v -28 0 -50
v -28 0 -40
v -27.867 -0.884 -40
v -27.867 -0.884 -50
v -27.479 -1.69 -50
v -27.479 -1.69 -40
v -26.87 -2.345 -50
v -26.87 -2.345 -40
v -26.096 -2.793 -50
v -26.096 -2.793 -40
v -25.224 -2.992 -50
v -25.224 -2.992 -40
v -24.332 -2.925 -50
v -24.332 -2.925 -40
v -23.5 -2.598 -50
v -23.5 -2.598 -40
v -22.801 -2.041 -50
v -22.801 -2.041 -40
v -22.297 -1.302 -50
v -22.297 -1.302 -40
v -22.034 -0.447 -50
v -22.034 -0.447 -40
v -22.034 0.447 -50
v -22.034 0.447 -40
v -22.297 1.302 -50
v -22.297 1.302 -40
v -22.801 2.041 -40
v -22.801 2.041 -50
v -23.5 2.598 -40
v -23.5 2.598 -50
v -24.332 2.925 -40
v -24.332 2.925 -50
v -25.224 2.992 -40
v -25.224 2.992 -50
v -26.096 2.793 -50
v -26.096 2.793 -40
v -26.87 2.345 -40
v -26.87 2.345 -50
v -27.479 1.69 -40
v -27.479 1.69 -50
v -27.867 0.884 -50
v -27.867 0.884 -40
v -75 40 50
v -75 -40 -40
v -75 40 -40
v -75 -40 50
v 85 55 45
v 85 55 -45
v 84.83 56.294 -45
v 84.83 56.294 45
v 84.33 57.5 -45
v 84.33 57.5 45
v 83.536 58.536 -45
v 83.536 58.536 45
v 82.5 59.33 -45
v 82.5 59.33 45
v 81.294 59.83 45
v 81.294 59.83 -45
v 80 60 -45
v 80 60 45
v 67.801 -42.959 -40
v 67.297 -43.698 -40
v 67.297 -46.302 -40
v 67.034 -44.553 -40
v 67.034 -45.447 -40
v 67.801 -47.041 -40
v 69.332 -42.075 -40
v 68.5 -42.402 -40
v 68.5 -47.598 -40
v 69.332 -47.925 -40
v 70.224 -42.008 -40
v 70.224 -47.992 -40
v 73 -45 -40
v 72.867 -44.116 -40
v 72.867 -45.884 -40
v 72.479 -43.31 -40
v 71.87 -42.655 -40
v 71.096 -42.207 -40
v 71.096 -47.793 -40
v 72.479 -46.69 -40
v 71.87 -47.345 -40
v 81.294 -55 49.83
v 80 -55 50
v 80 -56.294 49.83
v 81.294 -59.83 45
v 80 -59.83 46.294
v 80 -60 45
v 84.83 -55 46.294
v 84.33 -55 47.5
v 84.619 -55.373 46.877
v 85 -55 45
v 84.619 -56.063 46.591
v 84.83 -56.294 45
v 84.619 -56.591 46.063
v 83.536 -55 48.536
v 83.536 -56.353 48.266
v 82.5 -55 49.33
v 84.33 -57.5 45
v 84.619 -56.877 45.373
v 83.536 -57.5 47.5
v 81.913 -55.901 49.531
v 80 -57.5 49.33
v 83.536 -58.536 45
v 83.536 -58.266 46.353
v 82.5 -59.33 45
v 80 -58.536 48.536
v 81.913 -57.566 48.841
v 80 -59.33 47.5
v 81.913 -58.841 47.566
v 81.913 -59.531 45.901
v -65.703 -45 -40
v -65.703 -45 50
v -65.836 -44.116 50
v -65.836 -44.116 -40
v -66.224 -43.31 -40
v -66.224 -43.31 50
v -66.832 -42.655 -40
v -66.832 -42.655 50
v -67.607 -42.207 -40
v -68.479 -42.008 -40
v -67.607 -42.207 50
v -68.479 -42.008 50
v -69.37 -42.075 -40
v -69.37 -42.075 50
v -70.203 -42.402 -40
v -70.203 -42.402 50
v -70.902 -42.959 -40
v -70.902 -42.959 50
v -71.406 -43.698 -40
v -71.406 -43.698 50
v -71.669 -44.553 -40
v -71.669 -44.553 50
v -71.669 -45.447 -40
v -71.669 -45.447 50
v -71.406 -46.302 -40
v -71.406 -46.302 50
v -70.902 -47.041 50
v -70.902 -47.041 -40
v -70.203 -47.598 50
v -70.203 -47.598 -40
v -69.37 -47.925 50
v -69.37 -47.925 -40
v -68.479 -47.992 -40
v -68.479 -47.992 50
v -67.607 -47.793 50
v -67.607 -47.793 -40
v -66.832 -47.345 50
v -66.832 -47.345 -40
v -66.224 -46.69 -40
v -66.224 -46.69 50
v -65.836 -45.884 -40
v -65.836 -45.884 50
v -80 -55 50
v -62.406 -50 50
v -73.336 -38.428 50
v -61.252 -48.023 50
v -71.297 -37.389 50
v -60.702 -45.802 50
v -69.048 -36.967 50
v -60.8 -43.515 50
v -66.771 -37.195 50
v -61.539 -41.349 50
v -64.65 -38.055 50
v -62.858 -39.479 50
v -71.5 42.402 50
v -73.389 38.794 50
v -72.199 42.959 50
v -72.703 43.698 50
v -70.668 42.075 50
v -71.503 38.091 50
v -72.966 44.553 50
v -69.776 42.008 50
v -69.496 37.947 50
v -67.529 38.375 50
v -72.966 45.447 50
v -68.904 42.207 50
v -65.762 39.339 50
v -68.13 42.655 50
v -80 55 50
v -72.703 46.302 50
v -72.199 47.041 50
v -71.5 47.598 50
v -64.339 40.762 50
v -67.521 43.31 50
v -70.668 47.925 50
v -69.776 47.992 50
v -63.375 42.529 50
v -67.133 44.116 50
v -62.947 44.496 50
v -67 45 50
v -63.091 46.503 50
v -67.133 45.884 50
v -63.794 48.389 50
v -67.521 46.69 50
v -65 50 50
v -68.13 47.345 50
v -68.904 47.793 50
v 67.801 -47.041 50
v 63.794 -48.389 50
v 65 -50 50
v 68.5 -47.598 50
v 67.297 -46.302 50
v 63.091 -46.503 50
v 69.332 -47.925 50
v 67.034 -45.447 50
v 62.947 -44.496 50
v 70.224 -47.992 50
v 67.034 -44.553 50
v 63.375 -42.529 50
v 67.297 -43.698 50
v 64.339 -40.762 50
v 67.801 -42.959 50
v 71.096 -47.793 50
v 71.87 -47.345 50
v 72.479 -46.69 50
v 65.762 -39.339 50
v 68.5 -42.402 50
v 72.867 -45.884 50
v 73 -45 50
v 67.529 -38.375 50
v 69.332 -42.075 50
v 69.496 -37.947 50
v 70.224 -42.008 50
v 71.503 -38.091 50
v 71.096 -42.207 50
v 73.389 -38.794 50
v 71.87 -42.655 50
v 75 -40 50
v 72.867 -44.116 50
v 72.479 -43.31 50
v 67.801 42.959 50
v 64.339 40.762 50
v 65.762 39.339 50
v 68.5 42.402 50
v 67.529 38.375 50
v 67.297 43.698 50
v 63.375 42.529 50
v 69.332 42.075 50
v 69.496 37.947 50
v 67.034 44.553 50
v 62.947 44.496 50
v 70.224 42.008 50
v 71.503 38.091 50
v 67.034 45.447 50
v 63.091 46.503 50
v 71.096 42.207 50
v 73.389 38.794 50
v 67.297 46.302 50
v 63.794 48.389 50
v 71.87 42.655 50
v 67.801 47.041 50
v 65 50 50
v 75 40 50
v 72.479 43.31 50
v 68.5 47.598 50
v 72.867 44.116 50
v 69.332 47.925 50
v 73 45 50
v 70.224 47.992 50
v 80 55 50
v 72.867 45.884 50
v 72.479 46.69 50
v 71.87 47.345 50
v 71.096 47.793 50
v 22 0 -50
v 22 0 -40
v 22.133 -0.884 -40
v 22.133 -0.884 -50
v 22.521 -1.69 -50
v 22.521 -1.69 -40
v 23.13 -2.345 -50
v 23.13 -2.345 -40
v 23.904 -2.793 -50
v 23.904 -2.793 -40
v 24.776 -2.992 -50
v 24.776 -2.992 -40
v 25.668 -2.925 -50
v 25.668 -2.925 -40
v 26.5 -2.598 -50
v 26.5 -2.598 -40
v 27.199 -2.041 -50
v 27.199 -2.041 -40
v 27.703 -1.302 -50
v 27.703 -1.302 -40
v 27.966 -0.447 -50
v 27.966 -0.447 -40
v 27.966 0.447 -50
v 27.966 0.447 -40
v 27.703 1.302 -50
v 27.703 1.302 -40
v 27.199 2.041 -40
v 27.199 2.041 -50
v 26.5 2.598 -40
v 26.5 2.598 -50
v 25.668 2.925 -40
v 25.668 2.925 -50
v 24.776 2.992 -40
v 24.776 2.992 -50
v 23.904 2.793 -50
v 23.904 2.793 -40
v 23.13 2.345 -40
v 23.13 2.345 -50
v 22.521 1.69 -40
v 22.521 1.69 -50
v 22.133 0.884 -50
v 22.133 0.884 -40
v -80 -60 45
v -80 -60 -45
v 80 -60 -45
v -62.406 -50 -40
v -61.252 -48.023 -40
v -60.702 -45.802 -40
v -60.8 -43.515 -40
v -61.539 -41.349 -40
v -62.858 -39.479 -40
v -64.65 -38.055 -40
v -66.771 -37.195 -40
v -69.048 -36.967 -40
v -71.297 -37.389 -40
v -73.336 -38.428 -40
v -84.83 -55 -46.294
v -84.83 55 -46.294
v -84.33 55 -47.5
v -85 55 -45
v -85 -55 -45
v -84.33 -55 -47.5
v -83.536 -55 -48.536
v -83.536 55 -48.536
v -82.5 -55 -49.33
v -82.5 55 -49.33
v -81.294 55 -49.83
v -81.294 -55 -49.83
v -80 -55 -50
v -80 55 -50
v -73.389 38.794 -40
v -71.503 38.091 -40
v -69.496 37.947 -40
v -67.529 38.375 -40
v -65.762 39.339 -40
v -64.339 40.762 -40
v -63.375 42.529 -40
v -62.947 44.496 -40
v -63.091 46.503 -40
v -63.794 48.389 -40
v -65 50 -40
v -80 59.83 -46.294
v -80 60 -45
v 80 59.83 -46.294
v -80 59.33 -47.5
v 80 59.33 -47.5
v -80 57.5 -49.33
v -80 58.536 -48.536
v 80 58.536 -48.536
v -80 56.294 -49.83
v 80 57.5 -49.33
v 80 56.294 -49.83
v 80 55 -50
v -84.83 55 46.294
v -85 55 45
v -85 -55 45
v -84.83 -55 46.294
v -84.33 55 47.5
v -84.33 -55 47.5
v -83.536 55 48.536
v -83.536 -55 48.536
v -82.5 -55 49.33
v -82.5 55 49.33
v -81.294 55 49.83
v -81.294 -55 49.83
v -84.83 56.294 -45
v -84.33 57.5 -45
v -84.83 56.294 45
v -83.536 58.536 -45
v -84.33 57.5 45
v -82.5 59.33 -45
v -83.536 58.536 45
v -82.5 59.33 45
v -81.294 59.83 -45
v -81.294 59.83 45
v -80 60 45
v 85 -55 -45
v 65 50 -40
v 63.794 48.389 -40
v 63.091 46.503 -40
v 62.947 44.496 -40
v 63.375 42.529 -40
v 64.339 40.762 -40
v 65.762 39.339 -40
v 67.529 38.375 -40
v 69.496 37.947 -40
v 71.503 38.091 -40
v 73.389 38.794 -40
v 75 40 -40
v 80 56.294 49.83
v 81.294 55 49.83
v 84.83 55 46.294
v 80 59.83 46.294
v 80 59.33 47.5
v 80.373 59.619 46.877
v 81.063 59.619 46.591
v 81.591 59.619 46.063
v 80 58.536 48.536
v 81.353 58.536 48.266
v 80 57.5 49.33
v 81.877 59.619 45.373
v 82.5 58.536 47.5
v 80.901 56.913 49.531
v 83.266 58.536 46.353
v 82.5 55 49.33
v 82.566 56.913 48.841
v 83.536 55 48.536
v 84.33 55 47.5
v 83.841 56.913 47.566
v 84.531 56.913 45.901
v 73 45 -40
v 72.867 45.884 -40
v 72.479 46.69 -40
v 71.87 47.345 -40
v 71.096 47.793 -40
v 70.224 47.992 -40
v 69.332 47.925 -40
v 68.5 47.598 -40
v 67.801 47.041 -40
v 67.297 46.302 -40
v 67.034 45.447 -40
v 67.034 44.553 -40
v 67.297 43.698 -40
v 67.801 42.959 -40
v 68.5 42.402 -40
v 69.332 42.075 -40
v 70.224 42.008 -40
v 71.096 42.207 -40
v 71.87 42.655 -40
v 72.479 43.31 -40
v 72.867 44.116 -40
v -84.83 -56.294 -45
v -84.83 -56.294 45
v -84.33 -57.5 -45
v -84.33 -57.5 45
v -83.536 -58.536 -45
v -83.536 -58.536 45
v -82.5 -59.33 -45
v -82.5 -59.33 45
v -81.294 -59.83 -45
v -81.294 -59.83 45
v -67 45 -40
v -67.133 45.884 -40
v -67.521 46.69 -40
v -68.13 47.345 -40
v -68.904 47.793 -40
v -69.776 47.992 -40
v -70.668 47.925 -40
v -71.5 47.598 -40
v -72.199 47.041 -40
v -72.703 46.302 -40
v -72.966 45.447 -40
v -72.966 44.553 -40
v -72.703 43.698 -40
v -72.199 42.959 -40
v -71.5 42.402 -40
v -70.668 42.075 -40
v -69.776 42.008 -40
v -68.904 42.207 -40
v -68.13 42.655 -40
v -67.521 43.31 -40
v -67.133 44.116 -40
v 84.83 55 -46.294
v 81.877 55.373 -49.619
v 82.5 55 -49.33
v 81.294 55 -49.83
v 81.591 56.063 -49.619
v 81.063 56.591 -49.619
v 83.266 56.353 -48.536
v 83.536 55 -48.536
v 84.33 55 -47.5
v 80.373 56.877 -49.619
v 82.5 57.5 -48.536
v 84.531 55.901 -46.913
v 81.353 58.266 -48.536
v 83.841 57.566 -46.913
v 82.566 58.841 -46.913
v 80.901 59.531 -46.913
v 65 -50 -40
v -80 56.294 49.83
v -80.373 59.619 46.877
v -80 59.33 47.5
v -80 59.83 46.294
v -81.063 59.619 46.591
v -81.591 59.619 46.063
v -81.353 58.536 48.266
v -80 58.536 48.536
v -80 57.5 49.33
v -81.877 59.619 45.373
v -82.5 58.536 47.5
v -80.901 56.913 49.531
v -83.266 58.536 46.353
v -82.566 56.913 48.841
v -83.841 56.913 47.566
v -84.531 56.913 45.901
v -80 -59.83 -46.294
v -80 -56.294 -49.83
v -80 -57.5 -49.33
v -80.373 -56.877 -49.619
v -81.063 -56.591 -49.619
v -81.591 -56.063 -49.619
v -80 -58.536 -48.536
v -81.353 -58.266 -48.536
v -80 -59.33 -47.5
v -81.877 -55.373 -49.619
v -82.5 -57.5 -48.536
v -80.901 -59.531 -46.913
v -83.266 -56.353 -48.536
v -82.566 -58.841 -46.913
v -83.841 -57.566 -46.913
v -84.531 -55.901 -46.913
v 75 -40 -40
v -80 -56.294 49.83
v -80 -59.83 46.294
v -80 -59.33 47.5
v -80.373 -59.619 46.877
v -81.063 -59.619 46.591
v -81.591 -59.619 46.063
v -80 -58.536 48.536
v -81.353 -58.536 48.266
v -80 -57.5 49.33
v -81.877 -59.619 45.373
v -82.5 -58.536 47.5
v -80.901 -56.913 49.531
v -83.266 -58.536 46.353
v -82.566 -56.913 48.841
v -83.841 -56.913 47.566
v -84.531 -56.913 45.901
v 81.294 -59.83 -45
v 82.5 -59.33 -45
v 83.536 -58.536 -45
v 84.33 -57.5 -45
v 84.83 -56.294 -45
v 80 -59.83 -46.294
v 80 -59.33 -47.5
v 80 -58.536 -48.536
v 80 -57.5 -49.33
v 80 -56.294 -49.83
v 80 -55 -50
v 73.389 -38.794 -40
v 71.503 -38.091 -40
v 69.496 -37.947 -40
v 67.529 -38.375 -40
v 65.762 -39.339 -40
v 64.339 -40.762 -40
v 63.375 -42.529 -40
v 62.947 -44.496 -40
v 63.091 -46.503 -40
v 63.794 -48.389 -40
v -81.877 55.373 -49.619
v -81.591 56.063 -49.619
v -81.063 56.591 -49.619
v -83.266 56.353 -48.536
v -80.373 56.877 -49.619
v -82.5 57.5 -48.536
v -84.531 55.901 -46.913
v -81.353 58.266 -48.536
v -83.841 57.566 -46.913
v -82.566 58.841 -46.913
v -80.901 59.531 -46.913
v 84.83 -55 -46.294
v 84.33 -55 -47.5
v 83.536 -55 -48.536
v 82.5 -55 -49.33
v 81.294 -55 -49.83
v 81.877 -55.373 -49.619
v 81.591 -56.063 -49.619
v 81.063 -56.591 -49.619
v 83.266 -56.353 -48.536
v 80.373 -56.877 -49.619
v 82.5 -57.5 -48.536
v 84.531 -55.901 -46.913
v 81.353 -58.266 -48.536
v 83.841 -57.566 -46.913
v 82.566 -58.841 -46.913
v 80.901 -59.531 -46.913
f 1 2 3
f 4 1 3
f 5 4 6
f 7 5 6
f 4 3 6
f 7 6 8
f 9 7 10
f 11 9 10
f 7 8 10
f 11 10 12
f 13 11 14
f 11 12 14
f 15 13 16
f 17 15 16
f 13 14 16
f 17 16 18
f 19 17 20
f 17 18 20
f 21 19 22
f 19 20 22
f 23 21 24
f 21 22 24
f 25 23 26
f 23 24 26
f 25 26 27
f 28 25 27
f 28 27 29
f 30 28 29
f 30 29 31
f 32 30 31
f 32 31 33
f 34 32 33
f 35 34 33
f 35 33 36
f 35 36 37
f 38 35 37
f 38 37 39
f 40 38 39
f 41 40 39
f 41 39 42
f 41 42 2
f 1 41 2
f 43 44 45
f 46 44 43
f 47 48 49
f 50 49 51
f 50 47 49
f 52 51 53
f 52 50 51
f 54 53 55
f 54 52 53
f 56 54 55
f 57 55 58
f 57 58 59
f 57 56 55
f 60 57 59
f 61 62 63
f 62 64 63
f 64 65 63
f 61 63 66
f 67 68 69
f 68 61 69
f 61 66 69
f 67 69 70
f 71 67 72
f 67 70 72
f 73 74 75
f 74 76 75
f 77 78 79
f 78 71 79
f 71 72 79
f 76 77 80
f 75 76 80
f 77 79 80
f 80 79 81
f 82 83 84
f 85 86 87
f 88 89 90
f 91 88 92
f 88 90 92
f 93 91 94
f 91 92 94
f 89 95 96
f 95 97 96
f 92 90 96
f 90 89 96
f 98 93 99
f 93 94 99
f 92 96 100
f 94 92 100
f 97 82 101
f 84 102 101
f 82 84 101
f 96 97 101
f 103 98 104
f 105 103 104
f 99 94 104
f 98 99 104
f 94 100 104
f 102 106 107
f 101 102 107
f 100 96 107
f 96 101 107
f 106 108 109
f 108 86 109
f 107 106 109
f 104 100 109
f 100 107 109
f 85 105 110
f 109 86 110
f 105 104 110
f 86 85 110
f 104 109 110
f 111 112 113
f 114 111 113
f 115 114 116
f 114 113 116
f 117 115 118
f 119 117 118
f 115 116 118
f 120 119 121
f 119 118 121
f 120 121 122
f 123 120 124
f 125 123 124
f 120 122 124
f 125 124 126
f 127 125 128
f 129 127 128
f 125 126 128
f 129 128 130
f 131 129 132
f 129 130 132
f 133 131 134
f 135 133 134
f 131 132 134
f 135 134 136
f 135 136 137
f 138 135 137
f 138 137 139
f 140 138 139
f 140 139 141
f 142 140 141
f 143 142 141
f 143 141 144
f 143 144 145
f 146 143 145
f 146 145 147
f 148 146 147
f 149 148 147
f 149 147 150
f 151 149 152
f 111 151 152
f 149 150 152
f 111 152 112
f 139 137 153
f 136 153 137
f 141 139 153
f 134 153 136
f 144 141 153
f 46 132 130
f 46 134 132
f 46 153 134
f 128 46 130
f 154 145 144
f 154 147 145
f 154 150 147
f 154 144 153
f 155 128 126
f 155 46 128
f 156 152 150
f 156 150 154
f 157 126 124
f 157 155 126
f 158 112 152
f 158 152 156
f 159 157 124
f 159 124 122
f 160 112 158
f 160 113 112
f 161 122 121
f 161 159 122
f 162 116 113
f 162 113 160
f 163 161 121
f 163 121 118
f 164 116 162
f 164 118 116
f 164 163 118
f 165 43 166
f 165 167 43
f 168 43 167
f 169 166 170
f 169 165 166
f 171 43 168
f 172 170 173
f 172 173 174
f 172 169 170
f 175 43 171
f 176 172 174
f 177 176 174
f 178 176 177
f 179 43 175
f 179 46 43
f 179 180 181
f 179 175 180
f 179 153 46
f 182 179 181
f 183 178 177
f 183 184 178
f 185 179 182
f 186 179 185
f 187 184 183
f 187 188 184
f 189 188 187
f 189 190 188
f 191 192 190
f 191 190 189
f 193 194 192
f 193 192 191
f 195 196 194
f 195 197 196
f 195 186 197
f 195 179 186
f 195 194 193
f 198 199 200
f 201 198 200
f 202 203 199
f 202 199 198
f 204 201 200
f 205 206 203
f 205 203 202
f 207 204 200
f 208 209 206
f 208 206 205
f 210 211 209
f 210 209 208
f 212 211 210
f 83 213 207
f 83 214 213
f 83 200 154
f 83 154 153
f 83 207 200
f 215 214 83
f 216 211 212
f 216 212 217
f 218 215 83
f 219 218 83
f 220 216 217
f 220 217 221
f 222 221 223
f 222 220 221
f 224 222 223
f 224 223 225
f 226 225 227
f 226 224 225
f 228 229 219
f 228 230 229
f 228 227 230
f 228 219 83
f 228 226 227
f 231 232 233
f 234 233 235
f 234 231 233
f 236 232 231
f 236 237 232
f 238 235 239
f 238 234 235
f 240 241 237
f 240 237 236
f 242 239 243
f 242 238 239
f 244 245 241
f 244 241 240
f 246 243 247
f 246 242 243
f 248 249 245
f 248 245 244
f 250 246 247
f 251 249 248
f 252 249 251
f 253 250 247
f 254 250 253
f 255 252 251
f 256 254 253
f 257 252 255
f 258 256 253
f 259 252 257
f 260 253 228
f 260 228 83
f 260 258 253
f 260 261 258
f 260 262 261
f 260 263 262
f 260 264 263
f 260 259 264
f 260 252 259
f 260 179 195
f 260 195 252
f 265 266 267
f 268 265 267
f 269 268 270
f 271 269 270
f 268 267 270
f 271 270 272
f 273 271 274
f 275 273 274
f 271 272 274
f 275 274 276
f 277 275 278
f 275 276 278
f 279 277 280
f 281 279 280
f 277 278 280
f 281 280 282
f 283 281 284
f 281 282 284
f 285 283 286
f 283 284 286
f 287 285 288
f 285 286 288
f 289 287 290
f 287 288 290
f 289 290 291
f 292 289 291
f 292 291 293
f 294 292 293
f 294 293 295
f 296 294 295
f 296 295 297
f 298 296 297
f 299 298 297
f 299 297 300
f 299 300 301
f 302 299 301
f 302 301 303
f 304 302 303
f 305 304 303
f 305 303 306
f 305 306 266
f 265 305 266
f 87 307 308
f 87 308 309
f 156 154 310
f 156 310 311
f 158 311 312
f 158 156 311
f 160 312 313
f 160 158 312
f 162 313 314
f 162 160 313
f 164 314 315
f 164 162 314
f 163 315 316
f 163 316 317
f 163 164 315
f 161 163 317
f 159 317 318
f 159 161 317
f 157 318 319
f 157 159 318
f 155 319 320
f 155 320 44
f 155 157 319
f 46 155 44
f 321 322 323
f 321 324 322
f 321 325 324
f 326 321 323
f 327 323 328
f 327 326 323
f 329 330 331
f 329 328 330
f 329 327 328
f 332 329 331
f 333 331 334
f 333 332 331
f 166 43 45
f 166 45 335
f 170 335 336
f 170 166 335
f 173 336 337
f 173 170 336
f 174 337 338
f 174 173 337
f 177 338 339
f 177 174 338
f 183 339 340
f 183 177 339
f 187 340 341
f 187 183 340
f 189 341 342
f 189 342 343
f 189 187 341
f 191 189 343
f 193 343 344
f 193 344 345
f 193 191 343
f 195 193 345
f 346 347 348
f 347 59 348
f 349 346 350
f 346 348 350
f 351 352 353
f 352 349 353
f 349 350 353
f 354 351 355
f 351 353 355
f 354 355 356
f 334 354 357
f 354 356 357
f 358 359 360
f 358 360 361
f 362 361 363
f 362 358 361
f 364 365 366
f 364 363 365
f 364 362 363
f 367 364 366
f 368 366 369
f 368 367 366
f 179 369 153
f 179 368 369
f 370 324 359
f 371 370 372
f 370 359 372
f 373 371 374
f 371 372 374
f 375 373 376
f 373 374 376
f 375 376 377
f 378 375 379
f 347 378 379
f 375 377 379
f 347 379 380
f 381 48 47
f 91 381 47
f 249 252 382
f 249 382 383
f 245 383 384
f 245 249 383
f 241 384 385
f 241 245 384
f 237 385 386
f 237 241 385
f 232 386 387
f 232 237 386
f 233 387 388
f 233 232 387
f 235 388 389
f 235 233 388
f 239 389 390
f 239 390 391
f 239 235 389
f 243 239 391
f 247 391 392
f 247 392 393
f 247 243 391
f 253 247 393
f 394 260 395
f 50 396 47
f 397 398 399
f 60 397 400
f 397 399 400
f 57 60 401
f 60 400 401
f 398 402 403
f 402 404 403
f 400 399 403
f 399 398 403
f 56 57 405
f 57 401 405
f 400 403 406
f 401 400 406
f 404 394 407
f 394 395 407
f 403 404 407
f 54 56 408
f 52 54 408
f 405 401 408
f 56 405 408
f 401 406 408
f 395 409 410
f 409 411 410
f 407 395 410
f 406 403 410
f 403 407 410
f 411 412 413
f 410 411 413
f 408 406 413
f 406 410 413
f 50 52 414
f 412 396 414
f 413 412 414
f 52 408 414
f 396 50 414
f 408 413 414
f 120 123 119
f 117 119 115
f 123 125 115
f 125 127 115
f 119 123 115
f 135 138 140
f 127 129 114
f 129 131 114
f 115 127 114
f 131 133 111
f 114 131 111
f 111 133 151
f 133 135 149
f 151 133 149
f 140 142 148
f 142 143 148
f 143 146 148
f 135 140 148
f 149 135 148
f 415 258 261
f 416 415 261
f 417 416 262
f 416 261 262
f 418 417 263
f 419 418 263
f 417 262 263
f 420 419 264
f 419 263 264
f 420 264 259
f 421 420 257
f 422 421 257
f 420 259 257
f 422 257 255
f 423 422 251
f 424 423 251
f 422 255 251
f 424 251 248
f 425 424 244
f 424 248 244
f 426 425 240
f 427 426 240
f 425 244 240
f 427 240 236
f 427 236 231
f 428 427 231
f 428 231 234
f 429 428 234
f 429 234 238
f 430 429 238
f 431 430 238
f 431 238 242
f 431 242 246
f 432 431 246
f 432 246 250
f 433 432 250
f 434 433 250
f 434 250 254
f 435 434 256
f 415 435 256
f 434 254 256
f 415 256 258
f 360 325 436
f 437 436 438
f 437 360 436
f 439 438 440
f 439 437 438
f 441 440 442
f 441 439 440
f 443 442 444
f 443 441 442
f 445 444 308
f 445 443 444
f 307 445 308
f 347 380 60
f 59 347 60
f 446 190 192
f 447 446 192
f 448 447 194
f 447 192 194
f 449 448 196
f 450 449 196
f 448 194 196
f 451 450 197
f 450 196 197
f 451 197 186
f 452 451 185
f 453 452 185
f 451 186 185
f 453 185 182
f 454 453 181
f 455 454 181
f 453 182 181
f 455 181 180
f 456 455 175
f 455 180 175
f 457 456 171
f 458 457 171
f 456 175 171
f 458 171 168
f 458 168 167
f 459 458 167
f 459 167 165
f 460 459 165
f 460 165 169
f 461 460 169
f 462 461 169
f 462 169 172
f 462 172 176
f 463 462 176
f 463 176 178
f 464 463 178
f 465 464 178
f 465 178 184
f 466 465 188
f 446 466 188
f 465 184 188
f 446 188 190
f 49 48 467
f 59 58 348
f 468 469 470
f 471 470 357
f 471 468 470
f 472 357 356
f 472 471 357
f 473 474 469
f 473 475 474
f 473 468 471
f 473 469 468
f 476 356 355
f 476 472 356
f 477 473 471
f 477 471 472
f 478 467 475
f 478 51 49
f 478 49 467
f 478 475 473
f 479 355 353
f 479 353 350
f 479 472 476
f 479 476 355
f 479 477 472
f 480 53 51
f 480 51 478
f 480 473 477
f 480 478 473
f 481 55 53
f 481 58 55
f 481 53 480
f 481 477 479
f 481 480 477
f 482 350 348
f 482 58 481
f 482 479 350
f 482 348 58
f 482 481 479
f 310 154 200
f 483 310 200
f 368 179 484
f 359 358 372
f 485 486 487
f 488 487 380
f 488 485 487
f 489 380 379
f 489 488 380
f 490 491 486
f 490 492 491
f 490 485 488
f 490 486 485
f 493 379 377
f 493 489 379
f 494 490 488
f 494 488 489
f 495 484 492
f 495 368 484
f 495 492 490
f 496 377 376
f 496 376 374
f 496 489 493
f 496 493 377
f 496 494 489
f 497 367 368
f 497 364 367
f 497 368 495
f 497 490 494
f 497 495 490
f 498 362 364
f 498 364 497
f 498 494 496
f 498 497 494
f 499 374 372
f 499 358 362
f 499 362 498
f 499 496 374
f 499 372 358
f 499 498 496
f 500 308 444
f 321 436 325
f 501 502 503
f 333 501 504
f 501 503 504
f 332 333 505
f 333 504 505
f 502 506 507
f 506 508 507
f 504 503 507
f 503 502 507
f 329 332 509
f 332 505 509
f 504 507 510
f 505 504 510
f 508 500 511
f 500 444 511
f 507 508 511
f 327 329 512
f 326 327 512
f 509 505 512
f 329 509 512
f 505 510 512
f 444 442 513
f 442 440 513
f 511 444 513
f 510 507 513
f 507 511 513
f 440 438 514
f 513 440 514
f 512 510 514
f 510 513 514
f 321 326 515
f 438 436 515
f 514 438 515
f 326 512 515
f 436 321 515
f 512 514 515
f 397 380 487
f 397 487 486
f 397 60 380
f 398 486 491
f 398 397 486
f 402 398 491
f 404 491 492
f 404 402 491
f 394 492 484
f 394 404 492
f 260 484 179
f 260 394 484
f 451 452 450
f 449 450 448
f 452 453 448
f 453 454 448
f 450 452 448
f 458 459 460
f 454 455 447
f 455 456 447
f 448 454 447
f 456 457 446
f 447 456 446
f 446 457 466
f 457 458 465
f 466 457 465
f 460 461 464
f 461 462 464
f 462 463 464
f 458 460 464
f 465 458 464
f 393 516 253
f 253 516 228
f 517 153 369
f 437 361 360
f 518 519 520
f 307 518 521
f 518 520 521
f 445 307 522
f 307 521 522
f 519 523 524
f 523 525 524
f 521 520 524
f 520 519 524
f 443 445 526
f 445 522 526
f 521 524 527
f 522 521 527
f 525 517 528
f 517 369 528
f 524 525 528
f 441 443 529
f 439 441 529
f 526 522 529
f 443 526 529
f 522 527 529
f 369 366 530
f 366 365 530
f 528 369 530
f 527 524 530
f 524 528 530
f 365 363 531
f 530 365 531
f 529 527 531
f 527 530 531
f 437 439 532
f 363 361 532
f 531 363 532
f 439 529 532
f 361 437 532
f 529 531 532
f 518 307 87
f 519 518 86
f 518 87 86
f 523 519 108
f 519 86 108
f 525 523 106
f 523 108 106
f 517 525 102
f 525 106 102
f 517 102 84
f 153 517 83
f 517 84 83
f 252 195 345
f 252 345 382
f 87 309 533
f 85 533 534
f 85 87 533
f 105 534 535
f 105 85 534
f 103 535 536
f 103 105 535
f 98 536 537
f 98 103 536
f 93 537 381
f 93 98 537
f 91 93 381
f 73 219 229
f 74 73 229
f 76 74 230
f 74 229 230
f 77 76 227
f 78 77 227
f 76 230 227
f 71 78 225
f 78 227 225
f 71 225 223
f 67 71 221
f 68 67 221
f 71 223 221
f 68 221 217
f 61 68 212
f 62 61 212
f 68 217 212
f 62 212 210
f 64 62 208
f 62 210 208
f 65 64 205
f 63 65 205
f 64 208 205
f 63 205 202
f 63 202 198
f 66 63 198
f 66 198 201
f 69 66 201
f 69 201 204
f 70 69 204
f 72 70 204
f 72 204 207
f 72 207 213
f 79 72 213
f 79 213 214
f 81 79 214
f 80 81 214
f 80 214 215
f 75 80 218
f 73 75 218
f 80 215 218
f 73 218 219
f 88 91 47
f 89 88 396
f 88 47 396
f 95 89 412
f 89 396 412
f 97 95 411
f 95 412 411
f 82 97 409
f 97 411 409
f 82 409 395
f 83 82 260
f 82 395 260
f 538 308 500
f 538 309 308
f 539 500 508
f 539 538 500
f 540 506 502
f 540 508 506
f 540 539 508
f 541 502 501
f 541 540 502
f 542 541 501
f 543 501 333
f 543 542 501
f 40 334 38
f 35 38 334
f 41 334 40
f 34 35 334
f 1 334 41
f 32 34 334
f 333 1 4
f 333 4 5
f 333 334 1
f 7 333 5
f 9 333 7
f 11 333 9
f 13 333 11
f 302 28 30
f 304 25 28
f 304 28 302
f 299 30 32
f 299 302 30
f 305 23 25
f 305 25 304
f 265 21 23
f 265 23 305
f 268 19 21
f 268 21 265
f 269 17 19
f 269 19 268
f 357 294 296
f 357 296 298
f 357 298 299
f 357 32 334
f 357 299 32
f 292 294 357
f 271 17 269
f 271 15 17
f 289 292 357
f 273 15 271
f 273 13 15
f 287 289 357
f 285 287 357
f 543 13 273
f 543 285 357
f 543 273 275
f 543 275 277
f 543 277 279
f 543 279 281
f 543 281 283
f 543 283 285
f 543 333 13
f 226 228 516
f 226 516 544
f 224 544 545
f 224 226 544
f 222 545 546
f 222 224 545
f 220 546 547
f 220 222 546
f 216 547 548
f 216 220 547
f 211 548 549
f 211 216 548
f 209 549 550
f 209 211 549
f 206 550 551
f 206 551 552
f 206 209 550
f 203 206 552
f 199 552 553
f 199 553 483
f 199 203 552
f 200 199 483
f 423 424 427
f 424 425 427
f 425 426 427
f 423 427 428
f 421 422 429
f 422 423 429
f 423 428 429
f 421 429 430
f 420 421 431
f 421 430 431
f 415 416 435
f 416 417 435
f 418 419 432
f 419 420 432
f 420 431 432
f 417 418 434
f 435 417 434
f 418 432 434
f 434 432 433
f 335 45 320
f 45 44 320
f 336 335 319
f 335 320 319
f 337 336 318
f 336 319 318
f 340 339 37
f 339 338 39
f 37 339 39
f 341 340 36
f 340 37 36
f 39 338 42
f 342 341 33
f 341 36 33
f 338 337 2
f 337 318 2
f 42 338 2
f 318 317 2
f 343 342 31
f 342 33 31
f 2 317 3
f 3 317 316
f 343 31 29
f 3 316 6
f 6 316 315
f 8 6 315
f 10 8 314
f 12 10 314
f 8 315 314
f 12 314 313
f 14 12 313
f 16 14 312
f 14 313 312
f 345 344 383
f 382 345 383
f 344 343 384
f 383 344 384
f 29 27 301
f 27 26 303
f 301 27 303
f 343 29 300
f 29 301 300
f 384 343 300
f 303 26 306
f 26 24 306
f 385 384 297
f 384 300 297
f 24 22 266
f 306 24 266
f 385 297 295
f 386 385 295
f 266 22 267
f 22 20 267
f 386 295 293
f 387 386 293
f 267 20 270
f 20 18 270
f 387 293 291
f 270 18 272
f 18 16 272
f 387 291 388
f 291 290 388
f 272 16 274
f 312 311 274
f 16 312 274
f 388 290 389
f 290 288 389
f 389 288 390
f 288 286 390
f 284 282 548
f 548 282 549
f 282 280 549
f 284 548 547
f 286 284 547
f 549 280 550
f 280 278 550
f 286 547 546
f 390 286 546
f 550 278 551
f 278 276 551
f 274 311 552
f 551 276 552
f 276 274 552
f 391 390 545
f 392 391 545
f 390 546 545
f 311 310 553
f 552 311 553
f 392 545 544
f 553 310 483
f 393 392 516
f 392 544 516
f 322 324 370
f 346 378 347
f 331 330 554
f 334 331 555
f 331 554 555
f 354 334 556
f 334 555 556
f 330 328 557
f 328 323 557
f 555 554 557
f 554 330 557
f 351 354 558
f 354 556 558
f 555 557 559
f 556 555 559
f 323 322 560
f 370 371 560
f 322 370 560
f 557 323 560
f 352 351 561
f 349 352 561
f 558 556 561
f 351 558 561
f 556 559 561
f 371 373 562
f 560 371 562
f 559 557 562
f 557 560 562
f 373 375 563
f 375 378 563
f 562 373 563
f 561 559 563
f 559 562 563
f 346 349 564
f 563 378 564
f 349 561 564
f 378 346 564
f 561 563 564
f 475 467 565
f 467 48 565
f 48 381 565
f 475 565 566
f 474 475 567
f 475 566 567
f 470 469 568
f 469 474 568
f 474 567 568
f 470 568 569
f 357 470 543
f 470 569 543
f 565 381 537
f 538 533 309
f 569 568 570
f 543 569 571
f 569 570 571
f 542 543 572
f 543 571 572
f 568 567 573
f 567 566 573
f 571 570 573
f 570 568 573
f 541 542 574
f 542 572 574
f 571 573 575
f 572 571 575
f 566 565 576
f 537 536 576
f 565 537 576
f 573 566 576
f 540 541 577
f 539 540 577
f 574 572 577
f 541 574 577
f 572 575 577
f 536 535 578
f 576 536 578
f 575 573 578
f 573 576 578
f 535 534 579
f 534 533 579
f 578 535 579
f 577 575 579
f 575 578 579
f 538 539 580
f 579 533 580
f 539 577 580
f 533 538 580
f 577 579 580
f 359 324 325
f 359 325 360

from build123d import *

# Parameters (mm, degrees)
F0_W     = 170
F0_H     = 100
F1_DEPTH = 60
F2_T     = -10
F3_R     = 5
F4_R     = 3
F5_DEPTH = 90
F7_D     = 6


with BuildPart() as f1:
    # F0 (on Front) → F1 (new body, symmetric)
    with BuildSketch(Plane.XZ):
        Rectangle(F0_W, F0_H)
    extrude(amount=F1_DEPTH, both=True)

    # F2
    f2_openings = [f1.faces().sort_by_distance(p)[0] for p in [
        (0, 0, 50),
    ]]
    offset(amount=F2_T, openings=f2_openings)

    # F3
    f3_edges = [f1.edges().sort_by_distance(p)[0] for p in [
        (-85, 0, 50),
        (0, -60, 50),
        (85, 0, 50),
        (0, 60, 50),
        (85, 60, 0),
        (85, -60, 0),
        (85, 0, -50),
        (-85, -60, 0),
        (0, -60, -50),
        (-85, 60, 0),
        (-85, 0, -50),
        (0, 60, -50),
    ]]
    fillet(f3_edges, radius=F3_R)

    # F4 (on face) → F5 (join, through all)
    with BuildSketch(Plane.XY.offset(50)):
        with BuildLine():
            Line((-65, 50), (-75, 50))
            Line((-75, 50), (-75, 40))
            ThreePointArc((-75, 40), (-65, 40), (-65, 50))
        make_face()
        with Locations((-70, 45)):
            Circle(F4_R, mode=Mode.SUBTRACT)
        with BuildLine():
            Line((75, 40), (75, 50))
            Line((75, 50), (65, 50))
            ThreePointArc((65, 50), (65, 40), (75, 40))
        make_face()
        with Locations((70, 45)):
            Circle(F4_R, mode=Mode.SUBTRACT)
        with BuildLine():
            Line((65, -50), (75, -50))
            Line((75, -50), (75, -40))
            ThreePointArc((75, -40), (65, -40), (65, -50))
        make_face()
        with Locations((70, -45)):
            Circle(F4_R, mode=Mode.SUBTRACT)
        with BuildLine():
            Line((-75, -40), (-75, -50))
            Line((-75, -50), (-62.405661, -50))
            ThreePointArc((-62.405661, -50), (-63.70283, -38.70283), (-75, -40))
        make_face()
        with Locations((-68.70283, -45)):
            Circle(F4_R, mode=Mode.SUBTRACT)
    extrude(amount=-F5_DEPTH)

    # F7 (through all)
    with Locations(Plane(origin=(0, 0, -50), x_dir=(1, 0, 0), z_dir=(0, 0, -1))):
        with Locations((-25, 0), (25, 0)):
            Hole(F7_D / 2)


solid = f1.part
